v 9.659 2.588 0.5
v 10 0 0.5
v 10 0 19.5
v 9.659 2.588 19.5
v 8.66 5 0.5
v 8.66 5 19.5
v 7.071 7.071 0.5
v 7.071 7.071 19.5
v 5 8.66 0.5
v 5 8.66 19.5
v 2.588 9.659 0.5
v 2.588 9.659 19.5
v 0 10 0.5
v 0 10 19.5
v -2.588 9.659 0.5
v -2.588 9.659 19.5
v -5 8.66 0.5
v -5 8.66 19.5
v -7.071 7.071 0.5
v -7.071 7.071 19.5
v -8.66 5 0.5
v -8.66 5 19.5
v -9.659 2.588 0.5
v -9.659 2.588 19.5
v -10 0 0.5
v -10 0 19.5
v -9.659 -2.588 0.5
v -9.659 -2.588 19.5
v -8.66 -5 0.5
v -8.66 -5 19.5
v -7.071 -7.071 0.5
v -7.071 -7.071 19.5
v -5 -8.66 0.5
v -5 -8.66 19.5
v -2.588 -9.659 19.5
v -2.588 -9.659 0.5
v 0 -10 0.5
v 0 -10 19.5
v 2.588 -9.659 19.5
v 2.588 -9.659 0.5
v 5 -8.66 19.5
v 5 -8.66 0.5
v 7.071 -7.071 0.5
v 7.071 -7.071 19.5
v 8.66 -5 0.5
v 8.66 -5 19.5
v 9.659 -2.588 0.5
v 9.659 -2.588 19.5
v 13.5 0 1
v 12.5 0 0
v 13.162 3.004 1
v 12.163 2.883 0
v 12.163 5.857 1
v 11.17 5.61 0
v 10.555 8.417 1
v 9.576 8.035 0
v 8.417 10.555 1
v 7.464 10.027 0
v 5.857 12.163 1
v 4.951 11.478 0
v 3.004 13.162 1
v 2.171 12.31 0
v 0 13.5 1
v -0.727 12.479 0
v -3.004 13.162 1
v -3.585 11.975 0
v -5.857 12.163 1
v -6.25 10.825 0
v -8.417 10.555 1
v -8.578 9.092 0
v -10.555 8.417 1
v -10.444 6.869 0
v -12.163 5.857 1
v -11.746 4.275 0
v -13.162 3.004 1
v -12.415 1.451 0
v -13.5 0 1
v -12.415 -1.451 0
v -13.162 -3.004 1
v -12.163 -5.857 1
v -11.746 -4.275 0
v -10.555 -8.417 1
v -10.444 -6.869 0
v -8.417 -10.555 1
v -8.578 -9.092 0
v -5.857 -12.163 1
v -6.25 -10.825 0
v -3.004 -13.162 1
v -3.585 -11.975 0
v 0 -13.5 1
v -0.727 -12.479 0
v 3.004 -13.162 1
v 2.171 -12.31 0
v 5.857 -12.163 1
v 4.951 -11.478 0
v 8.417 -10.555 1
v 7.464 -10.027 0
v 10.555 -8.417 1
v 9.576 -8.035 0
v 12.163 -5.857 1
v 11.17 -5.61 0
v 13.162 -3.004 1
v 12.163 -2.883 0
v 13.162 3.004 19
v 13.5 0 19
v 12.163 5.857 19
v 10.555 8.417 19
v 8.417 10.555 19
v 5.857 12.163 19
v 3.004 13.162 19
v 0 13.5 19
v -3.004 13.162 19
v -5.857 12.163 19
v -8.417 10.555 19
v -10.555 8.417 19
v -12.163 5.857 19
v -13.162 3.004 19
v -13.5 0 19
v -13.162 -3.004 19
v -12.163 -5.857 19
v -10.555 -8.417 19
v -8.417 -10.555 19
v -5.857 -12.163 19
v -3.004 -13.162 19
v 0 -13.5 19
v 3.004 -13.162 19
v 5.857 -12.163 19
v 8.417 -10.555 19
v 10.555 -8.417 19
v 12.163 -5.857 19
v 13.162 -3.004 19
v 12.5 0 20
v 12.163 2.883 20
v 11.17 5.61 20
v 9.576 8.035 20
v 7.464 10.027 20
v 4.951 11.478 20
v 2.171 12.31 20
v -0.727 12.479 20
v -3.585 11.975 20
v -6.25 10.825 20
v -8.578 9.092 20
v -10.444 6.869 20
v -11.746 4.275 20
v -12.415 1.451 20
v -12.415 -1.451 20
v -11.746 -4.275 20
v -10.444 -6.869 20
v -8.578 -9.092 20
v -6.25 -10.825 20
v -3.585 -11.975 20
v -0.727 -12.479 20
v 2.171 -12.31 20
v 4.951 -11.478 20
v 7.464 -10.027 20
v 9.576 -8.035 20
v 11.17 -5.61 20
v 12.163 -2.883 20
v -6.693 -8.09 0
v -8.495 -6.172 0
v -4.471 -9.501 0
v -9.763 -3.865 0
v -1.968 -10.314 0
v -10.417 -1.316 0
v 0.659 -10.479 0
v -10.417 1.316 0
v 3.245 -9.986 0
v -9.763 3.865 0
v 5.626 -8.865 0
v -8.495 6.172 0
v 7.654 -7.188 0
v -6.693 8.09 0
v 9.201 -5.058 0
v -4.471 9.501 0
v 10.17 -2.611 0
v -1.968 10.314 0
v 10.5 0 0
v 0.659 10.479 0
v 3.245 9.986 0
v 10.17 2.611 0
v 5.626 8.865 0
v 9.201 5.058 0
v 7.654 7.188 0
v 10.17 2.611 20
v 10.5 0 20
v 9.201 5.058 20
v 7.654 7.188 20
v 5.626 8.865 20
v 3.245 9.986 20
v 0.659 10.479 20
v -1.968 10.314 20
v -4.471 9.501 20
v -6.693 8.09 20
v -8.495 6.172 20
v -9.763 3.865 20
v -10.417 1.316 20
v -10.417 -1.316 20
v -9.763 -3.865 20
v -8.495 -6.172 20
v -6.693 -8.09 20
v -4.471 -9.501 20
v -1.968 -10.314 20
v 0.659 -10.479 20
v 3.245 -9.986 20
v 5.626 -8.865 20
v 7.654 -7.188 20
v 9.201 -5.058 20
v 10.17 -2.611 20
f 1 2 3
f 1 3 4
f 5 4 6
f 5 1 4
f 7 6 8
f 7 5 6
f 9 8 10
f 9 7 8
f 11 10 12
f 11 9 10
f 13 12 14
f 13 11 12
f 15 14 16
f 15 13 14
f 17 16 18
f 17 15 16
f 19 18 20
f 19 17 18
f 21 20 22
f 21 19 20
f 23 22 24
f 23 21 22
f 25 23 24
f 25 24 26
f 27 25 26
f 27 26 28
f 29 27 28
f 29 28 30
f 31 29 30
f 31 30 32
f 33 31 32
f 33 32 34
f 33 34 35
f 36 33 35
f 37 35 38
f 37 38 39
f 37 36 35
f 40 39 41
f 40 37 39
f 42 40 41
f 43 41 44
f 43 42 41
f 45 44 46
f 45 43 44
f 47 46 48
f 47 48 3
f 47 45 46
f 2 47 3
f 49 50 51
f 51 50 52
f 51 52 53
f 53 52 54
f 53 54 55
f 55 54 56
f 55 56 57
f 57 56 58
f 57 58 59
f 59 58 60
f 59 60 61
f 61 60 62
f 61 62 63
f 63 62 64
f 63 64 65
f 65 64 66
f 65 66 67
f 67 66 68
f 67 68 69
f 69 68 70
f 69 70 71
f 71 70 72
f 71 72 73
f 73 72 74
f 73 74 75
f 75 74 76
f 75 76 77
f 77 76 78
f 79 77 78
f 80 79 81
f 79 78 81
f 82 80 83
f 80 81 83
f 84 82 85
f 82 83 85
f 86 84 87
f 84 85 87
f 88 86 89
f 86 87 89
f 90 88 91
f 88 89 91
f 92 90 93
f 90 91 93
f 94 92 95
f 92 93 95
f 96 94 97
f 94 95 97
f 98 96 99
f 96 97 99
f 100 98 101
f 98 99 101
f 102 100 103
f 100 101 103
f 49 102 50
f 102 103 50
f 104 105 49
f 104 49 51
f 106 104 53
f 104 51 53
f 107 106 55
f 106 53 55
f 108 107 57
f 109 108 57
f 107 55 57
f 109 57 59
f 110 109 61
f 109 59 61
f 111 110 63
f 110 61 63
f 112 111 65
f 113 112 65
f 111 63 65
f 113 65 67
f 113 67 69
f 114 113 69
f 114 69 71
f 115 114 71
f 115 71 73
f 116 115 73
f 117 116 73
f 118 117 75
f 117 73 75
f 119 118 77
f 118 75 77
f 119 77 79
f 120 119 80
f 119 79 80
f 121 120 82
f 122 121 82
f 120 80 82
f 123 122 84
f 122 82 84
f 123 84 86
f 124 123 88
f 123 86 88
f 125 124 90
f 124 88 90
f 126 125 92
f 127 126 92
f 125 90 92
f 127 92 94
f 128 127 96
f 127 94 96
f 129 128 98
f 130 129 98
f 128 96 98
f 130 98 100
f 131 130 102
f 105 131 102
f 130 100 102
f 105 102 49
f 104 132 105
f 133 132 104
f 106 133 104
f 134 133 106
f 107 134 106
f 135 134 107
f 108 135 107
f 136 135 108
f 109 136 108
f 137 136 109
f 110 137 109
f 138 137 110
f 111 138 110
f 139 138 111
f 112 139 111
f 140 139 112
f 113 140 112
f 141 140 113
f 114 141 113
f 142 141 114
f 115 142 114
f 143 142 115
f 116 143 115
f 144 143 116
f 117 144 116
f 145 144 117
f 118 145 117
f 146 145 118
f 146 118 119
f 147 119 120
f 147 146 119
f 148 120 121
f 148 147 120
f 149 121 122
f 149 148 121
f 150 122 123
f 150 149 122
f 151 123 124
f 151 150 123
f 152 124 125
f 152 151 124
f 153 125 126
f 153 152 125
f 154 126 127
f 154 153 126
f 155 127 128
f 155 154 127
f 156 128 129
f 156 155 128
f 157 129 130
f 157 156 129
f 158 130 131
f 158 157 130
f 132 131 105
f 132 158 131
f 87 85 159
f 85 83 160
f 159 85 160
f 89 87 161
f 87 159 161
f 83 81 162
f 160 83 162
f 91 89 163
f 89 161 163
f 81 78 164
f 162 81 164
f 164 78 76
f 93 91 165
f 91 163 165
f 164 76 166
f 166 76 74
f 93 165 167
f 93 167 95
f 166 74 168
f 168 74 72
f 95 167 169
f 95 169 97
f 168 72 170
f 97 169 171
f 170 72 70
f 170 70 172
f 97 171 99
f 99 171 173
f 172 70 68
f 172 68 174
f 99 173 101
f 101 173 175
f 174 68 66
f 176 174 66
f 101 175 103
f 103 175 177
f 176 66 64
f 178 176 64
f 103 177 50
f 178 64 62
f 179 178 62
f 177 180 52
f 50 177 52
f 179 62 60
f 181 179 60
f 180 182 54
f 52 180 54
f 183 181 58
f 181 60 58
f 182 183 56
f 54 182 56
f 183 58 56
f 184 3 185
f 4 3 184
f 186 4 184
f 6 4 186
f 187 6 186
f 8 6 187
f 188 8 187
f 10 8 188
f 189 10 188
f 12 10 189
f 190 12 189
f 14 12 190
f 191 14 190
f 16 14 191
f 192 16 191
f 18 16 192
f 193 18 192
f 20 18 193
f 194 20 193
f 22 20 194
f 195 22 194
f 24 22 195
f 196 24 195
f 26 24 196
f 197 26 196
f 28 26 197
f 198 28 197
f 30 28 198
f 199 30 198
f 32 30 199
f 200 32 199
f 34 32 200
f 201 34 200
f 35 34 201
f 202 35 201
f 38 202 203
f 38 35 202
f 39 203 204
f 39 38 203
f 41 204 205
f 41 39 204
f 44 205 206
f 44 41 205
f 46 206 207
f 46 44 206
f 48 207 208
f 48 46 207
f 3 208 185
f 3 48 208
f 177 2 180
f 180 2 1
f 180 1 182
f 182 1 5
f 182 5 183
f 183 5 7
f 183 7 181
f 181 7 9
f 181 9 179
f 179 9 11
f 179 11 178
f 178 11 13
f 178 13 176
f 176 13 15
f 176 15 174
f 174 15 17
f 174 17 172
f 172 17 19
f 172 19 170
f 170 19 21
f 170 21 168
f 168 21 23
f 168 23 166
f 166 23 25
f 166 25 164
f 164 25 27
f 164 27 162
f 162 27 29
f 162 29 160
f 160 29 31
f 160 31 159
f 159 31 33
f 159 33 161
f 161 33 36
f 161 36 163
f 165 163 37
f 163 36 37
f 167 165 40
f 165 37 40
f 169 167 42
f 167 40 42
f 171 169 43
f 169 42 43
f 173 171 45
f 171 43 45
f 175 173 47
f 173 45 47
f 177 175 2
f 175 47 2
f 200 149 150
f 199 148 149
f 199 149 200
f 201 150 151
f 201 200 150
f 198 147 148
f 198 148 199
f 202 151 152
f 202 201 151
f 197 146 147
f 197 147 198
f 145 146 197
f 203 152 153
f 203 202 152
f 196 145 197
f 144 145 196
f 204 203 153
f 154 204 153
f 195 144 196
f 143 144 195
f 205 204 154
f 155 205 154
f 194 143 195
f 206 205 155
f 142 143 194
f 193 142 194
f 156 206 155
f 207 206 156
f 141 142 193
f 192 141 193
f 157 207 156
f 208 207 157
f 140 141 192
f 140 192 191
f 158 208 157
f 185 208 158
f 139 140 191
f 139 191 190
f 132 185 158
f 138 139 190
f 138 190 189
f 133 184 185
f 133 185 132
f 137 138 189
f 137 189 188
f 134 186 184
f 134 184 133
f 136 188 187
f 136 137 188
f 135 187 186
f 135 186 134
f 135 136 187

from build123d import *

# Parameters (mm, degrees)
CROQUIS1_R              = 13.5
CROQUIS1_R_2            = 10
SALIENTE_EXTRUIR1_DEPTH = 20
CHAFL_N1_SIZE           = 1
CHAFL_N2_SIZE           = 0.5


with BuildPart() as part:
    # Croquis1 → Saliente-Extruir1 (new body)
    with BuildSketch(Plane.XY):
        Circle(CROQUIS1_R)
        Circle(CROQUIS1_R_2, mode=Mode.SUBTRACT)
    extrude(amount=SALIENTE_EXTRUIR1_DEPTH)

    # Chaflán1
    chafl_n1_edges = [part.edges().sort_by_distance(p)[0] for p in [
        (-13.5, 0, 0),
        (-13.5, 0, 20),
    ]]
    chamfer(chafl_n1_edges, length=CHAFL_N1_SIZE)

    # Chaflán2
    chafl_n2_edges = [part.edges().sort_by_distance(p)[0] for p in [
        (-10, 0, 0),
        (-10, 0, 20),
    ]]
    chamfer(chafl_n2_edges, length=CHAFL_N2_SIZE)


solid = part.part
